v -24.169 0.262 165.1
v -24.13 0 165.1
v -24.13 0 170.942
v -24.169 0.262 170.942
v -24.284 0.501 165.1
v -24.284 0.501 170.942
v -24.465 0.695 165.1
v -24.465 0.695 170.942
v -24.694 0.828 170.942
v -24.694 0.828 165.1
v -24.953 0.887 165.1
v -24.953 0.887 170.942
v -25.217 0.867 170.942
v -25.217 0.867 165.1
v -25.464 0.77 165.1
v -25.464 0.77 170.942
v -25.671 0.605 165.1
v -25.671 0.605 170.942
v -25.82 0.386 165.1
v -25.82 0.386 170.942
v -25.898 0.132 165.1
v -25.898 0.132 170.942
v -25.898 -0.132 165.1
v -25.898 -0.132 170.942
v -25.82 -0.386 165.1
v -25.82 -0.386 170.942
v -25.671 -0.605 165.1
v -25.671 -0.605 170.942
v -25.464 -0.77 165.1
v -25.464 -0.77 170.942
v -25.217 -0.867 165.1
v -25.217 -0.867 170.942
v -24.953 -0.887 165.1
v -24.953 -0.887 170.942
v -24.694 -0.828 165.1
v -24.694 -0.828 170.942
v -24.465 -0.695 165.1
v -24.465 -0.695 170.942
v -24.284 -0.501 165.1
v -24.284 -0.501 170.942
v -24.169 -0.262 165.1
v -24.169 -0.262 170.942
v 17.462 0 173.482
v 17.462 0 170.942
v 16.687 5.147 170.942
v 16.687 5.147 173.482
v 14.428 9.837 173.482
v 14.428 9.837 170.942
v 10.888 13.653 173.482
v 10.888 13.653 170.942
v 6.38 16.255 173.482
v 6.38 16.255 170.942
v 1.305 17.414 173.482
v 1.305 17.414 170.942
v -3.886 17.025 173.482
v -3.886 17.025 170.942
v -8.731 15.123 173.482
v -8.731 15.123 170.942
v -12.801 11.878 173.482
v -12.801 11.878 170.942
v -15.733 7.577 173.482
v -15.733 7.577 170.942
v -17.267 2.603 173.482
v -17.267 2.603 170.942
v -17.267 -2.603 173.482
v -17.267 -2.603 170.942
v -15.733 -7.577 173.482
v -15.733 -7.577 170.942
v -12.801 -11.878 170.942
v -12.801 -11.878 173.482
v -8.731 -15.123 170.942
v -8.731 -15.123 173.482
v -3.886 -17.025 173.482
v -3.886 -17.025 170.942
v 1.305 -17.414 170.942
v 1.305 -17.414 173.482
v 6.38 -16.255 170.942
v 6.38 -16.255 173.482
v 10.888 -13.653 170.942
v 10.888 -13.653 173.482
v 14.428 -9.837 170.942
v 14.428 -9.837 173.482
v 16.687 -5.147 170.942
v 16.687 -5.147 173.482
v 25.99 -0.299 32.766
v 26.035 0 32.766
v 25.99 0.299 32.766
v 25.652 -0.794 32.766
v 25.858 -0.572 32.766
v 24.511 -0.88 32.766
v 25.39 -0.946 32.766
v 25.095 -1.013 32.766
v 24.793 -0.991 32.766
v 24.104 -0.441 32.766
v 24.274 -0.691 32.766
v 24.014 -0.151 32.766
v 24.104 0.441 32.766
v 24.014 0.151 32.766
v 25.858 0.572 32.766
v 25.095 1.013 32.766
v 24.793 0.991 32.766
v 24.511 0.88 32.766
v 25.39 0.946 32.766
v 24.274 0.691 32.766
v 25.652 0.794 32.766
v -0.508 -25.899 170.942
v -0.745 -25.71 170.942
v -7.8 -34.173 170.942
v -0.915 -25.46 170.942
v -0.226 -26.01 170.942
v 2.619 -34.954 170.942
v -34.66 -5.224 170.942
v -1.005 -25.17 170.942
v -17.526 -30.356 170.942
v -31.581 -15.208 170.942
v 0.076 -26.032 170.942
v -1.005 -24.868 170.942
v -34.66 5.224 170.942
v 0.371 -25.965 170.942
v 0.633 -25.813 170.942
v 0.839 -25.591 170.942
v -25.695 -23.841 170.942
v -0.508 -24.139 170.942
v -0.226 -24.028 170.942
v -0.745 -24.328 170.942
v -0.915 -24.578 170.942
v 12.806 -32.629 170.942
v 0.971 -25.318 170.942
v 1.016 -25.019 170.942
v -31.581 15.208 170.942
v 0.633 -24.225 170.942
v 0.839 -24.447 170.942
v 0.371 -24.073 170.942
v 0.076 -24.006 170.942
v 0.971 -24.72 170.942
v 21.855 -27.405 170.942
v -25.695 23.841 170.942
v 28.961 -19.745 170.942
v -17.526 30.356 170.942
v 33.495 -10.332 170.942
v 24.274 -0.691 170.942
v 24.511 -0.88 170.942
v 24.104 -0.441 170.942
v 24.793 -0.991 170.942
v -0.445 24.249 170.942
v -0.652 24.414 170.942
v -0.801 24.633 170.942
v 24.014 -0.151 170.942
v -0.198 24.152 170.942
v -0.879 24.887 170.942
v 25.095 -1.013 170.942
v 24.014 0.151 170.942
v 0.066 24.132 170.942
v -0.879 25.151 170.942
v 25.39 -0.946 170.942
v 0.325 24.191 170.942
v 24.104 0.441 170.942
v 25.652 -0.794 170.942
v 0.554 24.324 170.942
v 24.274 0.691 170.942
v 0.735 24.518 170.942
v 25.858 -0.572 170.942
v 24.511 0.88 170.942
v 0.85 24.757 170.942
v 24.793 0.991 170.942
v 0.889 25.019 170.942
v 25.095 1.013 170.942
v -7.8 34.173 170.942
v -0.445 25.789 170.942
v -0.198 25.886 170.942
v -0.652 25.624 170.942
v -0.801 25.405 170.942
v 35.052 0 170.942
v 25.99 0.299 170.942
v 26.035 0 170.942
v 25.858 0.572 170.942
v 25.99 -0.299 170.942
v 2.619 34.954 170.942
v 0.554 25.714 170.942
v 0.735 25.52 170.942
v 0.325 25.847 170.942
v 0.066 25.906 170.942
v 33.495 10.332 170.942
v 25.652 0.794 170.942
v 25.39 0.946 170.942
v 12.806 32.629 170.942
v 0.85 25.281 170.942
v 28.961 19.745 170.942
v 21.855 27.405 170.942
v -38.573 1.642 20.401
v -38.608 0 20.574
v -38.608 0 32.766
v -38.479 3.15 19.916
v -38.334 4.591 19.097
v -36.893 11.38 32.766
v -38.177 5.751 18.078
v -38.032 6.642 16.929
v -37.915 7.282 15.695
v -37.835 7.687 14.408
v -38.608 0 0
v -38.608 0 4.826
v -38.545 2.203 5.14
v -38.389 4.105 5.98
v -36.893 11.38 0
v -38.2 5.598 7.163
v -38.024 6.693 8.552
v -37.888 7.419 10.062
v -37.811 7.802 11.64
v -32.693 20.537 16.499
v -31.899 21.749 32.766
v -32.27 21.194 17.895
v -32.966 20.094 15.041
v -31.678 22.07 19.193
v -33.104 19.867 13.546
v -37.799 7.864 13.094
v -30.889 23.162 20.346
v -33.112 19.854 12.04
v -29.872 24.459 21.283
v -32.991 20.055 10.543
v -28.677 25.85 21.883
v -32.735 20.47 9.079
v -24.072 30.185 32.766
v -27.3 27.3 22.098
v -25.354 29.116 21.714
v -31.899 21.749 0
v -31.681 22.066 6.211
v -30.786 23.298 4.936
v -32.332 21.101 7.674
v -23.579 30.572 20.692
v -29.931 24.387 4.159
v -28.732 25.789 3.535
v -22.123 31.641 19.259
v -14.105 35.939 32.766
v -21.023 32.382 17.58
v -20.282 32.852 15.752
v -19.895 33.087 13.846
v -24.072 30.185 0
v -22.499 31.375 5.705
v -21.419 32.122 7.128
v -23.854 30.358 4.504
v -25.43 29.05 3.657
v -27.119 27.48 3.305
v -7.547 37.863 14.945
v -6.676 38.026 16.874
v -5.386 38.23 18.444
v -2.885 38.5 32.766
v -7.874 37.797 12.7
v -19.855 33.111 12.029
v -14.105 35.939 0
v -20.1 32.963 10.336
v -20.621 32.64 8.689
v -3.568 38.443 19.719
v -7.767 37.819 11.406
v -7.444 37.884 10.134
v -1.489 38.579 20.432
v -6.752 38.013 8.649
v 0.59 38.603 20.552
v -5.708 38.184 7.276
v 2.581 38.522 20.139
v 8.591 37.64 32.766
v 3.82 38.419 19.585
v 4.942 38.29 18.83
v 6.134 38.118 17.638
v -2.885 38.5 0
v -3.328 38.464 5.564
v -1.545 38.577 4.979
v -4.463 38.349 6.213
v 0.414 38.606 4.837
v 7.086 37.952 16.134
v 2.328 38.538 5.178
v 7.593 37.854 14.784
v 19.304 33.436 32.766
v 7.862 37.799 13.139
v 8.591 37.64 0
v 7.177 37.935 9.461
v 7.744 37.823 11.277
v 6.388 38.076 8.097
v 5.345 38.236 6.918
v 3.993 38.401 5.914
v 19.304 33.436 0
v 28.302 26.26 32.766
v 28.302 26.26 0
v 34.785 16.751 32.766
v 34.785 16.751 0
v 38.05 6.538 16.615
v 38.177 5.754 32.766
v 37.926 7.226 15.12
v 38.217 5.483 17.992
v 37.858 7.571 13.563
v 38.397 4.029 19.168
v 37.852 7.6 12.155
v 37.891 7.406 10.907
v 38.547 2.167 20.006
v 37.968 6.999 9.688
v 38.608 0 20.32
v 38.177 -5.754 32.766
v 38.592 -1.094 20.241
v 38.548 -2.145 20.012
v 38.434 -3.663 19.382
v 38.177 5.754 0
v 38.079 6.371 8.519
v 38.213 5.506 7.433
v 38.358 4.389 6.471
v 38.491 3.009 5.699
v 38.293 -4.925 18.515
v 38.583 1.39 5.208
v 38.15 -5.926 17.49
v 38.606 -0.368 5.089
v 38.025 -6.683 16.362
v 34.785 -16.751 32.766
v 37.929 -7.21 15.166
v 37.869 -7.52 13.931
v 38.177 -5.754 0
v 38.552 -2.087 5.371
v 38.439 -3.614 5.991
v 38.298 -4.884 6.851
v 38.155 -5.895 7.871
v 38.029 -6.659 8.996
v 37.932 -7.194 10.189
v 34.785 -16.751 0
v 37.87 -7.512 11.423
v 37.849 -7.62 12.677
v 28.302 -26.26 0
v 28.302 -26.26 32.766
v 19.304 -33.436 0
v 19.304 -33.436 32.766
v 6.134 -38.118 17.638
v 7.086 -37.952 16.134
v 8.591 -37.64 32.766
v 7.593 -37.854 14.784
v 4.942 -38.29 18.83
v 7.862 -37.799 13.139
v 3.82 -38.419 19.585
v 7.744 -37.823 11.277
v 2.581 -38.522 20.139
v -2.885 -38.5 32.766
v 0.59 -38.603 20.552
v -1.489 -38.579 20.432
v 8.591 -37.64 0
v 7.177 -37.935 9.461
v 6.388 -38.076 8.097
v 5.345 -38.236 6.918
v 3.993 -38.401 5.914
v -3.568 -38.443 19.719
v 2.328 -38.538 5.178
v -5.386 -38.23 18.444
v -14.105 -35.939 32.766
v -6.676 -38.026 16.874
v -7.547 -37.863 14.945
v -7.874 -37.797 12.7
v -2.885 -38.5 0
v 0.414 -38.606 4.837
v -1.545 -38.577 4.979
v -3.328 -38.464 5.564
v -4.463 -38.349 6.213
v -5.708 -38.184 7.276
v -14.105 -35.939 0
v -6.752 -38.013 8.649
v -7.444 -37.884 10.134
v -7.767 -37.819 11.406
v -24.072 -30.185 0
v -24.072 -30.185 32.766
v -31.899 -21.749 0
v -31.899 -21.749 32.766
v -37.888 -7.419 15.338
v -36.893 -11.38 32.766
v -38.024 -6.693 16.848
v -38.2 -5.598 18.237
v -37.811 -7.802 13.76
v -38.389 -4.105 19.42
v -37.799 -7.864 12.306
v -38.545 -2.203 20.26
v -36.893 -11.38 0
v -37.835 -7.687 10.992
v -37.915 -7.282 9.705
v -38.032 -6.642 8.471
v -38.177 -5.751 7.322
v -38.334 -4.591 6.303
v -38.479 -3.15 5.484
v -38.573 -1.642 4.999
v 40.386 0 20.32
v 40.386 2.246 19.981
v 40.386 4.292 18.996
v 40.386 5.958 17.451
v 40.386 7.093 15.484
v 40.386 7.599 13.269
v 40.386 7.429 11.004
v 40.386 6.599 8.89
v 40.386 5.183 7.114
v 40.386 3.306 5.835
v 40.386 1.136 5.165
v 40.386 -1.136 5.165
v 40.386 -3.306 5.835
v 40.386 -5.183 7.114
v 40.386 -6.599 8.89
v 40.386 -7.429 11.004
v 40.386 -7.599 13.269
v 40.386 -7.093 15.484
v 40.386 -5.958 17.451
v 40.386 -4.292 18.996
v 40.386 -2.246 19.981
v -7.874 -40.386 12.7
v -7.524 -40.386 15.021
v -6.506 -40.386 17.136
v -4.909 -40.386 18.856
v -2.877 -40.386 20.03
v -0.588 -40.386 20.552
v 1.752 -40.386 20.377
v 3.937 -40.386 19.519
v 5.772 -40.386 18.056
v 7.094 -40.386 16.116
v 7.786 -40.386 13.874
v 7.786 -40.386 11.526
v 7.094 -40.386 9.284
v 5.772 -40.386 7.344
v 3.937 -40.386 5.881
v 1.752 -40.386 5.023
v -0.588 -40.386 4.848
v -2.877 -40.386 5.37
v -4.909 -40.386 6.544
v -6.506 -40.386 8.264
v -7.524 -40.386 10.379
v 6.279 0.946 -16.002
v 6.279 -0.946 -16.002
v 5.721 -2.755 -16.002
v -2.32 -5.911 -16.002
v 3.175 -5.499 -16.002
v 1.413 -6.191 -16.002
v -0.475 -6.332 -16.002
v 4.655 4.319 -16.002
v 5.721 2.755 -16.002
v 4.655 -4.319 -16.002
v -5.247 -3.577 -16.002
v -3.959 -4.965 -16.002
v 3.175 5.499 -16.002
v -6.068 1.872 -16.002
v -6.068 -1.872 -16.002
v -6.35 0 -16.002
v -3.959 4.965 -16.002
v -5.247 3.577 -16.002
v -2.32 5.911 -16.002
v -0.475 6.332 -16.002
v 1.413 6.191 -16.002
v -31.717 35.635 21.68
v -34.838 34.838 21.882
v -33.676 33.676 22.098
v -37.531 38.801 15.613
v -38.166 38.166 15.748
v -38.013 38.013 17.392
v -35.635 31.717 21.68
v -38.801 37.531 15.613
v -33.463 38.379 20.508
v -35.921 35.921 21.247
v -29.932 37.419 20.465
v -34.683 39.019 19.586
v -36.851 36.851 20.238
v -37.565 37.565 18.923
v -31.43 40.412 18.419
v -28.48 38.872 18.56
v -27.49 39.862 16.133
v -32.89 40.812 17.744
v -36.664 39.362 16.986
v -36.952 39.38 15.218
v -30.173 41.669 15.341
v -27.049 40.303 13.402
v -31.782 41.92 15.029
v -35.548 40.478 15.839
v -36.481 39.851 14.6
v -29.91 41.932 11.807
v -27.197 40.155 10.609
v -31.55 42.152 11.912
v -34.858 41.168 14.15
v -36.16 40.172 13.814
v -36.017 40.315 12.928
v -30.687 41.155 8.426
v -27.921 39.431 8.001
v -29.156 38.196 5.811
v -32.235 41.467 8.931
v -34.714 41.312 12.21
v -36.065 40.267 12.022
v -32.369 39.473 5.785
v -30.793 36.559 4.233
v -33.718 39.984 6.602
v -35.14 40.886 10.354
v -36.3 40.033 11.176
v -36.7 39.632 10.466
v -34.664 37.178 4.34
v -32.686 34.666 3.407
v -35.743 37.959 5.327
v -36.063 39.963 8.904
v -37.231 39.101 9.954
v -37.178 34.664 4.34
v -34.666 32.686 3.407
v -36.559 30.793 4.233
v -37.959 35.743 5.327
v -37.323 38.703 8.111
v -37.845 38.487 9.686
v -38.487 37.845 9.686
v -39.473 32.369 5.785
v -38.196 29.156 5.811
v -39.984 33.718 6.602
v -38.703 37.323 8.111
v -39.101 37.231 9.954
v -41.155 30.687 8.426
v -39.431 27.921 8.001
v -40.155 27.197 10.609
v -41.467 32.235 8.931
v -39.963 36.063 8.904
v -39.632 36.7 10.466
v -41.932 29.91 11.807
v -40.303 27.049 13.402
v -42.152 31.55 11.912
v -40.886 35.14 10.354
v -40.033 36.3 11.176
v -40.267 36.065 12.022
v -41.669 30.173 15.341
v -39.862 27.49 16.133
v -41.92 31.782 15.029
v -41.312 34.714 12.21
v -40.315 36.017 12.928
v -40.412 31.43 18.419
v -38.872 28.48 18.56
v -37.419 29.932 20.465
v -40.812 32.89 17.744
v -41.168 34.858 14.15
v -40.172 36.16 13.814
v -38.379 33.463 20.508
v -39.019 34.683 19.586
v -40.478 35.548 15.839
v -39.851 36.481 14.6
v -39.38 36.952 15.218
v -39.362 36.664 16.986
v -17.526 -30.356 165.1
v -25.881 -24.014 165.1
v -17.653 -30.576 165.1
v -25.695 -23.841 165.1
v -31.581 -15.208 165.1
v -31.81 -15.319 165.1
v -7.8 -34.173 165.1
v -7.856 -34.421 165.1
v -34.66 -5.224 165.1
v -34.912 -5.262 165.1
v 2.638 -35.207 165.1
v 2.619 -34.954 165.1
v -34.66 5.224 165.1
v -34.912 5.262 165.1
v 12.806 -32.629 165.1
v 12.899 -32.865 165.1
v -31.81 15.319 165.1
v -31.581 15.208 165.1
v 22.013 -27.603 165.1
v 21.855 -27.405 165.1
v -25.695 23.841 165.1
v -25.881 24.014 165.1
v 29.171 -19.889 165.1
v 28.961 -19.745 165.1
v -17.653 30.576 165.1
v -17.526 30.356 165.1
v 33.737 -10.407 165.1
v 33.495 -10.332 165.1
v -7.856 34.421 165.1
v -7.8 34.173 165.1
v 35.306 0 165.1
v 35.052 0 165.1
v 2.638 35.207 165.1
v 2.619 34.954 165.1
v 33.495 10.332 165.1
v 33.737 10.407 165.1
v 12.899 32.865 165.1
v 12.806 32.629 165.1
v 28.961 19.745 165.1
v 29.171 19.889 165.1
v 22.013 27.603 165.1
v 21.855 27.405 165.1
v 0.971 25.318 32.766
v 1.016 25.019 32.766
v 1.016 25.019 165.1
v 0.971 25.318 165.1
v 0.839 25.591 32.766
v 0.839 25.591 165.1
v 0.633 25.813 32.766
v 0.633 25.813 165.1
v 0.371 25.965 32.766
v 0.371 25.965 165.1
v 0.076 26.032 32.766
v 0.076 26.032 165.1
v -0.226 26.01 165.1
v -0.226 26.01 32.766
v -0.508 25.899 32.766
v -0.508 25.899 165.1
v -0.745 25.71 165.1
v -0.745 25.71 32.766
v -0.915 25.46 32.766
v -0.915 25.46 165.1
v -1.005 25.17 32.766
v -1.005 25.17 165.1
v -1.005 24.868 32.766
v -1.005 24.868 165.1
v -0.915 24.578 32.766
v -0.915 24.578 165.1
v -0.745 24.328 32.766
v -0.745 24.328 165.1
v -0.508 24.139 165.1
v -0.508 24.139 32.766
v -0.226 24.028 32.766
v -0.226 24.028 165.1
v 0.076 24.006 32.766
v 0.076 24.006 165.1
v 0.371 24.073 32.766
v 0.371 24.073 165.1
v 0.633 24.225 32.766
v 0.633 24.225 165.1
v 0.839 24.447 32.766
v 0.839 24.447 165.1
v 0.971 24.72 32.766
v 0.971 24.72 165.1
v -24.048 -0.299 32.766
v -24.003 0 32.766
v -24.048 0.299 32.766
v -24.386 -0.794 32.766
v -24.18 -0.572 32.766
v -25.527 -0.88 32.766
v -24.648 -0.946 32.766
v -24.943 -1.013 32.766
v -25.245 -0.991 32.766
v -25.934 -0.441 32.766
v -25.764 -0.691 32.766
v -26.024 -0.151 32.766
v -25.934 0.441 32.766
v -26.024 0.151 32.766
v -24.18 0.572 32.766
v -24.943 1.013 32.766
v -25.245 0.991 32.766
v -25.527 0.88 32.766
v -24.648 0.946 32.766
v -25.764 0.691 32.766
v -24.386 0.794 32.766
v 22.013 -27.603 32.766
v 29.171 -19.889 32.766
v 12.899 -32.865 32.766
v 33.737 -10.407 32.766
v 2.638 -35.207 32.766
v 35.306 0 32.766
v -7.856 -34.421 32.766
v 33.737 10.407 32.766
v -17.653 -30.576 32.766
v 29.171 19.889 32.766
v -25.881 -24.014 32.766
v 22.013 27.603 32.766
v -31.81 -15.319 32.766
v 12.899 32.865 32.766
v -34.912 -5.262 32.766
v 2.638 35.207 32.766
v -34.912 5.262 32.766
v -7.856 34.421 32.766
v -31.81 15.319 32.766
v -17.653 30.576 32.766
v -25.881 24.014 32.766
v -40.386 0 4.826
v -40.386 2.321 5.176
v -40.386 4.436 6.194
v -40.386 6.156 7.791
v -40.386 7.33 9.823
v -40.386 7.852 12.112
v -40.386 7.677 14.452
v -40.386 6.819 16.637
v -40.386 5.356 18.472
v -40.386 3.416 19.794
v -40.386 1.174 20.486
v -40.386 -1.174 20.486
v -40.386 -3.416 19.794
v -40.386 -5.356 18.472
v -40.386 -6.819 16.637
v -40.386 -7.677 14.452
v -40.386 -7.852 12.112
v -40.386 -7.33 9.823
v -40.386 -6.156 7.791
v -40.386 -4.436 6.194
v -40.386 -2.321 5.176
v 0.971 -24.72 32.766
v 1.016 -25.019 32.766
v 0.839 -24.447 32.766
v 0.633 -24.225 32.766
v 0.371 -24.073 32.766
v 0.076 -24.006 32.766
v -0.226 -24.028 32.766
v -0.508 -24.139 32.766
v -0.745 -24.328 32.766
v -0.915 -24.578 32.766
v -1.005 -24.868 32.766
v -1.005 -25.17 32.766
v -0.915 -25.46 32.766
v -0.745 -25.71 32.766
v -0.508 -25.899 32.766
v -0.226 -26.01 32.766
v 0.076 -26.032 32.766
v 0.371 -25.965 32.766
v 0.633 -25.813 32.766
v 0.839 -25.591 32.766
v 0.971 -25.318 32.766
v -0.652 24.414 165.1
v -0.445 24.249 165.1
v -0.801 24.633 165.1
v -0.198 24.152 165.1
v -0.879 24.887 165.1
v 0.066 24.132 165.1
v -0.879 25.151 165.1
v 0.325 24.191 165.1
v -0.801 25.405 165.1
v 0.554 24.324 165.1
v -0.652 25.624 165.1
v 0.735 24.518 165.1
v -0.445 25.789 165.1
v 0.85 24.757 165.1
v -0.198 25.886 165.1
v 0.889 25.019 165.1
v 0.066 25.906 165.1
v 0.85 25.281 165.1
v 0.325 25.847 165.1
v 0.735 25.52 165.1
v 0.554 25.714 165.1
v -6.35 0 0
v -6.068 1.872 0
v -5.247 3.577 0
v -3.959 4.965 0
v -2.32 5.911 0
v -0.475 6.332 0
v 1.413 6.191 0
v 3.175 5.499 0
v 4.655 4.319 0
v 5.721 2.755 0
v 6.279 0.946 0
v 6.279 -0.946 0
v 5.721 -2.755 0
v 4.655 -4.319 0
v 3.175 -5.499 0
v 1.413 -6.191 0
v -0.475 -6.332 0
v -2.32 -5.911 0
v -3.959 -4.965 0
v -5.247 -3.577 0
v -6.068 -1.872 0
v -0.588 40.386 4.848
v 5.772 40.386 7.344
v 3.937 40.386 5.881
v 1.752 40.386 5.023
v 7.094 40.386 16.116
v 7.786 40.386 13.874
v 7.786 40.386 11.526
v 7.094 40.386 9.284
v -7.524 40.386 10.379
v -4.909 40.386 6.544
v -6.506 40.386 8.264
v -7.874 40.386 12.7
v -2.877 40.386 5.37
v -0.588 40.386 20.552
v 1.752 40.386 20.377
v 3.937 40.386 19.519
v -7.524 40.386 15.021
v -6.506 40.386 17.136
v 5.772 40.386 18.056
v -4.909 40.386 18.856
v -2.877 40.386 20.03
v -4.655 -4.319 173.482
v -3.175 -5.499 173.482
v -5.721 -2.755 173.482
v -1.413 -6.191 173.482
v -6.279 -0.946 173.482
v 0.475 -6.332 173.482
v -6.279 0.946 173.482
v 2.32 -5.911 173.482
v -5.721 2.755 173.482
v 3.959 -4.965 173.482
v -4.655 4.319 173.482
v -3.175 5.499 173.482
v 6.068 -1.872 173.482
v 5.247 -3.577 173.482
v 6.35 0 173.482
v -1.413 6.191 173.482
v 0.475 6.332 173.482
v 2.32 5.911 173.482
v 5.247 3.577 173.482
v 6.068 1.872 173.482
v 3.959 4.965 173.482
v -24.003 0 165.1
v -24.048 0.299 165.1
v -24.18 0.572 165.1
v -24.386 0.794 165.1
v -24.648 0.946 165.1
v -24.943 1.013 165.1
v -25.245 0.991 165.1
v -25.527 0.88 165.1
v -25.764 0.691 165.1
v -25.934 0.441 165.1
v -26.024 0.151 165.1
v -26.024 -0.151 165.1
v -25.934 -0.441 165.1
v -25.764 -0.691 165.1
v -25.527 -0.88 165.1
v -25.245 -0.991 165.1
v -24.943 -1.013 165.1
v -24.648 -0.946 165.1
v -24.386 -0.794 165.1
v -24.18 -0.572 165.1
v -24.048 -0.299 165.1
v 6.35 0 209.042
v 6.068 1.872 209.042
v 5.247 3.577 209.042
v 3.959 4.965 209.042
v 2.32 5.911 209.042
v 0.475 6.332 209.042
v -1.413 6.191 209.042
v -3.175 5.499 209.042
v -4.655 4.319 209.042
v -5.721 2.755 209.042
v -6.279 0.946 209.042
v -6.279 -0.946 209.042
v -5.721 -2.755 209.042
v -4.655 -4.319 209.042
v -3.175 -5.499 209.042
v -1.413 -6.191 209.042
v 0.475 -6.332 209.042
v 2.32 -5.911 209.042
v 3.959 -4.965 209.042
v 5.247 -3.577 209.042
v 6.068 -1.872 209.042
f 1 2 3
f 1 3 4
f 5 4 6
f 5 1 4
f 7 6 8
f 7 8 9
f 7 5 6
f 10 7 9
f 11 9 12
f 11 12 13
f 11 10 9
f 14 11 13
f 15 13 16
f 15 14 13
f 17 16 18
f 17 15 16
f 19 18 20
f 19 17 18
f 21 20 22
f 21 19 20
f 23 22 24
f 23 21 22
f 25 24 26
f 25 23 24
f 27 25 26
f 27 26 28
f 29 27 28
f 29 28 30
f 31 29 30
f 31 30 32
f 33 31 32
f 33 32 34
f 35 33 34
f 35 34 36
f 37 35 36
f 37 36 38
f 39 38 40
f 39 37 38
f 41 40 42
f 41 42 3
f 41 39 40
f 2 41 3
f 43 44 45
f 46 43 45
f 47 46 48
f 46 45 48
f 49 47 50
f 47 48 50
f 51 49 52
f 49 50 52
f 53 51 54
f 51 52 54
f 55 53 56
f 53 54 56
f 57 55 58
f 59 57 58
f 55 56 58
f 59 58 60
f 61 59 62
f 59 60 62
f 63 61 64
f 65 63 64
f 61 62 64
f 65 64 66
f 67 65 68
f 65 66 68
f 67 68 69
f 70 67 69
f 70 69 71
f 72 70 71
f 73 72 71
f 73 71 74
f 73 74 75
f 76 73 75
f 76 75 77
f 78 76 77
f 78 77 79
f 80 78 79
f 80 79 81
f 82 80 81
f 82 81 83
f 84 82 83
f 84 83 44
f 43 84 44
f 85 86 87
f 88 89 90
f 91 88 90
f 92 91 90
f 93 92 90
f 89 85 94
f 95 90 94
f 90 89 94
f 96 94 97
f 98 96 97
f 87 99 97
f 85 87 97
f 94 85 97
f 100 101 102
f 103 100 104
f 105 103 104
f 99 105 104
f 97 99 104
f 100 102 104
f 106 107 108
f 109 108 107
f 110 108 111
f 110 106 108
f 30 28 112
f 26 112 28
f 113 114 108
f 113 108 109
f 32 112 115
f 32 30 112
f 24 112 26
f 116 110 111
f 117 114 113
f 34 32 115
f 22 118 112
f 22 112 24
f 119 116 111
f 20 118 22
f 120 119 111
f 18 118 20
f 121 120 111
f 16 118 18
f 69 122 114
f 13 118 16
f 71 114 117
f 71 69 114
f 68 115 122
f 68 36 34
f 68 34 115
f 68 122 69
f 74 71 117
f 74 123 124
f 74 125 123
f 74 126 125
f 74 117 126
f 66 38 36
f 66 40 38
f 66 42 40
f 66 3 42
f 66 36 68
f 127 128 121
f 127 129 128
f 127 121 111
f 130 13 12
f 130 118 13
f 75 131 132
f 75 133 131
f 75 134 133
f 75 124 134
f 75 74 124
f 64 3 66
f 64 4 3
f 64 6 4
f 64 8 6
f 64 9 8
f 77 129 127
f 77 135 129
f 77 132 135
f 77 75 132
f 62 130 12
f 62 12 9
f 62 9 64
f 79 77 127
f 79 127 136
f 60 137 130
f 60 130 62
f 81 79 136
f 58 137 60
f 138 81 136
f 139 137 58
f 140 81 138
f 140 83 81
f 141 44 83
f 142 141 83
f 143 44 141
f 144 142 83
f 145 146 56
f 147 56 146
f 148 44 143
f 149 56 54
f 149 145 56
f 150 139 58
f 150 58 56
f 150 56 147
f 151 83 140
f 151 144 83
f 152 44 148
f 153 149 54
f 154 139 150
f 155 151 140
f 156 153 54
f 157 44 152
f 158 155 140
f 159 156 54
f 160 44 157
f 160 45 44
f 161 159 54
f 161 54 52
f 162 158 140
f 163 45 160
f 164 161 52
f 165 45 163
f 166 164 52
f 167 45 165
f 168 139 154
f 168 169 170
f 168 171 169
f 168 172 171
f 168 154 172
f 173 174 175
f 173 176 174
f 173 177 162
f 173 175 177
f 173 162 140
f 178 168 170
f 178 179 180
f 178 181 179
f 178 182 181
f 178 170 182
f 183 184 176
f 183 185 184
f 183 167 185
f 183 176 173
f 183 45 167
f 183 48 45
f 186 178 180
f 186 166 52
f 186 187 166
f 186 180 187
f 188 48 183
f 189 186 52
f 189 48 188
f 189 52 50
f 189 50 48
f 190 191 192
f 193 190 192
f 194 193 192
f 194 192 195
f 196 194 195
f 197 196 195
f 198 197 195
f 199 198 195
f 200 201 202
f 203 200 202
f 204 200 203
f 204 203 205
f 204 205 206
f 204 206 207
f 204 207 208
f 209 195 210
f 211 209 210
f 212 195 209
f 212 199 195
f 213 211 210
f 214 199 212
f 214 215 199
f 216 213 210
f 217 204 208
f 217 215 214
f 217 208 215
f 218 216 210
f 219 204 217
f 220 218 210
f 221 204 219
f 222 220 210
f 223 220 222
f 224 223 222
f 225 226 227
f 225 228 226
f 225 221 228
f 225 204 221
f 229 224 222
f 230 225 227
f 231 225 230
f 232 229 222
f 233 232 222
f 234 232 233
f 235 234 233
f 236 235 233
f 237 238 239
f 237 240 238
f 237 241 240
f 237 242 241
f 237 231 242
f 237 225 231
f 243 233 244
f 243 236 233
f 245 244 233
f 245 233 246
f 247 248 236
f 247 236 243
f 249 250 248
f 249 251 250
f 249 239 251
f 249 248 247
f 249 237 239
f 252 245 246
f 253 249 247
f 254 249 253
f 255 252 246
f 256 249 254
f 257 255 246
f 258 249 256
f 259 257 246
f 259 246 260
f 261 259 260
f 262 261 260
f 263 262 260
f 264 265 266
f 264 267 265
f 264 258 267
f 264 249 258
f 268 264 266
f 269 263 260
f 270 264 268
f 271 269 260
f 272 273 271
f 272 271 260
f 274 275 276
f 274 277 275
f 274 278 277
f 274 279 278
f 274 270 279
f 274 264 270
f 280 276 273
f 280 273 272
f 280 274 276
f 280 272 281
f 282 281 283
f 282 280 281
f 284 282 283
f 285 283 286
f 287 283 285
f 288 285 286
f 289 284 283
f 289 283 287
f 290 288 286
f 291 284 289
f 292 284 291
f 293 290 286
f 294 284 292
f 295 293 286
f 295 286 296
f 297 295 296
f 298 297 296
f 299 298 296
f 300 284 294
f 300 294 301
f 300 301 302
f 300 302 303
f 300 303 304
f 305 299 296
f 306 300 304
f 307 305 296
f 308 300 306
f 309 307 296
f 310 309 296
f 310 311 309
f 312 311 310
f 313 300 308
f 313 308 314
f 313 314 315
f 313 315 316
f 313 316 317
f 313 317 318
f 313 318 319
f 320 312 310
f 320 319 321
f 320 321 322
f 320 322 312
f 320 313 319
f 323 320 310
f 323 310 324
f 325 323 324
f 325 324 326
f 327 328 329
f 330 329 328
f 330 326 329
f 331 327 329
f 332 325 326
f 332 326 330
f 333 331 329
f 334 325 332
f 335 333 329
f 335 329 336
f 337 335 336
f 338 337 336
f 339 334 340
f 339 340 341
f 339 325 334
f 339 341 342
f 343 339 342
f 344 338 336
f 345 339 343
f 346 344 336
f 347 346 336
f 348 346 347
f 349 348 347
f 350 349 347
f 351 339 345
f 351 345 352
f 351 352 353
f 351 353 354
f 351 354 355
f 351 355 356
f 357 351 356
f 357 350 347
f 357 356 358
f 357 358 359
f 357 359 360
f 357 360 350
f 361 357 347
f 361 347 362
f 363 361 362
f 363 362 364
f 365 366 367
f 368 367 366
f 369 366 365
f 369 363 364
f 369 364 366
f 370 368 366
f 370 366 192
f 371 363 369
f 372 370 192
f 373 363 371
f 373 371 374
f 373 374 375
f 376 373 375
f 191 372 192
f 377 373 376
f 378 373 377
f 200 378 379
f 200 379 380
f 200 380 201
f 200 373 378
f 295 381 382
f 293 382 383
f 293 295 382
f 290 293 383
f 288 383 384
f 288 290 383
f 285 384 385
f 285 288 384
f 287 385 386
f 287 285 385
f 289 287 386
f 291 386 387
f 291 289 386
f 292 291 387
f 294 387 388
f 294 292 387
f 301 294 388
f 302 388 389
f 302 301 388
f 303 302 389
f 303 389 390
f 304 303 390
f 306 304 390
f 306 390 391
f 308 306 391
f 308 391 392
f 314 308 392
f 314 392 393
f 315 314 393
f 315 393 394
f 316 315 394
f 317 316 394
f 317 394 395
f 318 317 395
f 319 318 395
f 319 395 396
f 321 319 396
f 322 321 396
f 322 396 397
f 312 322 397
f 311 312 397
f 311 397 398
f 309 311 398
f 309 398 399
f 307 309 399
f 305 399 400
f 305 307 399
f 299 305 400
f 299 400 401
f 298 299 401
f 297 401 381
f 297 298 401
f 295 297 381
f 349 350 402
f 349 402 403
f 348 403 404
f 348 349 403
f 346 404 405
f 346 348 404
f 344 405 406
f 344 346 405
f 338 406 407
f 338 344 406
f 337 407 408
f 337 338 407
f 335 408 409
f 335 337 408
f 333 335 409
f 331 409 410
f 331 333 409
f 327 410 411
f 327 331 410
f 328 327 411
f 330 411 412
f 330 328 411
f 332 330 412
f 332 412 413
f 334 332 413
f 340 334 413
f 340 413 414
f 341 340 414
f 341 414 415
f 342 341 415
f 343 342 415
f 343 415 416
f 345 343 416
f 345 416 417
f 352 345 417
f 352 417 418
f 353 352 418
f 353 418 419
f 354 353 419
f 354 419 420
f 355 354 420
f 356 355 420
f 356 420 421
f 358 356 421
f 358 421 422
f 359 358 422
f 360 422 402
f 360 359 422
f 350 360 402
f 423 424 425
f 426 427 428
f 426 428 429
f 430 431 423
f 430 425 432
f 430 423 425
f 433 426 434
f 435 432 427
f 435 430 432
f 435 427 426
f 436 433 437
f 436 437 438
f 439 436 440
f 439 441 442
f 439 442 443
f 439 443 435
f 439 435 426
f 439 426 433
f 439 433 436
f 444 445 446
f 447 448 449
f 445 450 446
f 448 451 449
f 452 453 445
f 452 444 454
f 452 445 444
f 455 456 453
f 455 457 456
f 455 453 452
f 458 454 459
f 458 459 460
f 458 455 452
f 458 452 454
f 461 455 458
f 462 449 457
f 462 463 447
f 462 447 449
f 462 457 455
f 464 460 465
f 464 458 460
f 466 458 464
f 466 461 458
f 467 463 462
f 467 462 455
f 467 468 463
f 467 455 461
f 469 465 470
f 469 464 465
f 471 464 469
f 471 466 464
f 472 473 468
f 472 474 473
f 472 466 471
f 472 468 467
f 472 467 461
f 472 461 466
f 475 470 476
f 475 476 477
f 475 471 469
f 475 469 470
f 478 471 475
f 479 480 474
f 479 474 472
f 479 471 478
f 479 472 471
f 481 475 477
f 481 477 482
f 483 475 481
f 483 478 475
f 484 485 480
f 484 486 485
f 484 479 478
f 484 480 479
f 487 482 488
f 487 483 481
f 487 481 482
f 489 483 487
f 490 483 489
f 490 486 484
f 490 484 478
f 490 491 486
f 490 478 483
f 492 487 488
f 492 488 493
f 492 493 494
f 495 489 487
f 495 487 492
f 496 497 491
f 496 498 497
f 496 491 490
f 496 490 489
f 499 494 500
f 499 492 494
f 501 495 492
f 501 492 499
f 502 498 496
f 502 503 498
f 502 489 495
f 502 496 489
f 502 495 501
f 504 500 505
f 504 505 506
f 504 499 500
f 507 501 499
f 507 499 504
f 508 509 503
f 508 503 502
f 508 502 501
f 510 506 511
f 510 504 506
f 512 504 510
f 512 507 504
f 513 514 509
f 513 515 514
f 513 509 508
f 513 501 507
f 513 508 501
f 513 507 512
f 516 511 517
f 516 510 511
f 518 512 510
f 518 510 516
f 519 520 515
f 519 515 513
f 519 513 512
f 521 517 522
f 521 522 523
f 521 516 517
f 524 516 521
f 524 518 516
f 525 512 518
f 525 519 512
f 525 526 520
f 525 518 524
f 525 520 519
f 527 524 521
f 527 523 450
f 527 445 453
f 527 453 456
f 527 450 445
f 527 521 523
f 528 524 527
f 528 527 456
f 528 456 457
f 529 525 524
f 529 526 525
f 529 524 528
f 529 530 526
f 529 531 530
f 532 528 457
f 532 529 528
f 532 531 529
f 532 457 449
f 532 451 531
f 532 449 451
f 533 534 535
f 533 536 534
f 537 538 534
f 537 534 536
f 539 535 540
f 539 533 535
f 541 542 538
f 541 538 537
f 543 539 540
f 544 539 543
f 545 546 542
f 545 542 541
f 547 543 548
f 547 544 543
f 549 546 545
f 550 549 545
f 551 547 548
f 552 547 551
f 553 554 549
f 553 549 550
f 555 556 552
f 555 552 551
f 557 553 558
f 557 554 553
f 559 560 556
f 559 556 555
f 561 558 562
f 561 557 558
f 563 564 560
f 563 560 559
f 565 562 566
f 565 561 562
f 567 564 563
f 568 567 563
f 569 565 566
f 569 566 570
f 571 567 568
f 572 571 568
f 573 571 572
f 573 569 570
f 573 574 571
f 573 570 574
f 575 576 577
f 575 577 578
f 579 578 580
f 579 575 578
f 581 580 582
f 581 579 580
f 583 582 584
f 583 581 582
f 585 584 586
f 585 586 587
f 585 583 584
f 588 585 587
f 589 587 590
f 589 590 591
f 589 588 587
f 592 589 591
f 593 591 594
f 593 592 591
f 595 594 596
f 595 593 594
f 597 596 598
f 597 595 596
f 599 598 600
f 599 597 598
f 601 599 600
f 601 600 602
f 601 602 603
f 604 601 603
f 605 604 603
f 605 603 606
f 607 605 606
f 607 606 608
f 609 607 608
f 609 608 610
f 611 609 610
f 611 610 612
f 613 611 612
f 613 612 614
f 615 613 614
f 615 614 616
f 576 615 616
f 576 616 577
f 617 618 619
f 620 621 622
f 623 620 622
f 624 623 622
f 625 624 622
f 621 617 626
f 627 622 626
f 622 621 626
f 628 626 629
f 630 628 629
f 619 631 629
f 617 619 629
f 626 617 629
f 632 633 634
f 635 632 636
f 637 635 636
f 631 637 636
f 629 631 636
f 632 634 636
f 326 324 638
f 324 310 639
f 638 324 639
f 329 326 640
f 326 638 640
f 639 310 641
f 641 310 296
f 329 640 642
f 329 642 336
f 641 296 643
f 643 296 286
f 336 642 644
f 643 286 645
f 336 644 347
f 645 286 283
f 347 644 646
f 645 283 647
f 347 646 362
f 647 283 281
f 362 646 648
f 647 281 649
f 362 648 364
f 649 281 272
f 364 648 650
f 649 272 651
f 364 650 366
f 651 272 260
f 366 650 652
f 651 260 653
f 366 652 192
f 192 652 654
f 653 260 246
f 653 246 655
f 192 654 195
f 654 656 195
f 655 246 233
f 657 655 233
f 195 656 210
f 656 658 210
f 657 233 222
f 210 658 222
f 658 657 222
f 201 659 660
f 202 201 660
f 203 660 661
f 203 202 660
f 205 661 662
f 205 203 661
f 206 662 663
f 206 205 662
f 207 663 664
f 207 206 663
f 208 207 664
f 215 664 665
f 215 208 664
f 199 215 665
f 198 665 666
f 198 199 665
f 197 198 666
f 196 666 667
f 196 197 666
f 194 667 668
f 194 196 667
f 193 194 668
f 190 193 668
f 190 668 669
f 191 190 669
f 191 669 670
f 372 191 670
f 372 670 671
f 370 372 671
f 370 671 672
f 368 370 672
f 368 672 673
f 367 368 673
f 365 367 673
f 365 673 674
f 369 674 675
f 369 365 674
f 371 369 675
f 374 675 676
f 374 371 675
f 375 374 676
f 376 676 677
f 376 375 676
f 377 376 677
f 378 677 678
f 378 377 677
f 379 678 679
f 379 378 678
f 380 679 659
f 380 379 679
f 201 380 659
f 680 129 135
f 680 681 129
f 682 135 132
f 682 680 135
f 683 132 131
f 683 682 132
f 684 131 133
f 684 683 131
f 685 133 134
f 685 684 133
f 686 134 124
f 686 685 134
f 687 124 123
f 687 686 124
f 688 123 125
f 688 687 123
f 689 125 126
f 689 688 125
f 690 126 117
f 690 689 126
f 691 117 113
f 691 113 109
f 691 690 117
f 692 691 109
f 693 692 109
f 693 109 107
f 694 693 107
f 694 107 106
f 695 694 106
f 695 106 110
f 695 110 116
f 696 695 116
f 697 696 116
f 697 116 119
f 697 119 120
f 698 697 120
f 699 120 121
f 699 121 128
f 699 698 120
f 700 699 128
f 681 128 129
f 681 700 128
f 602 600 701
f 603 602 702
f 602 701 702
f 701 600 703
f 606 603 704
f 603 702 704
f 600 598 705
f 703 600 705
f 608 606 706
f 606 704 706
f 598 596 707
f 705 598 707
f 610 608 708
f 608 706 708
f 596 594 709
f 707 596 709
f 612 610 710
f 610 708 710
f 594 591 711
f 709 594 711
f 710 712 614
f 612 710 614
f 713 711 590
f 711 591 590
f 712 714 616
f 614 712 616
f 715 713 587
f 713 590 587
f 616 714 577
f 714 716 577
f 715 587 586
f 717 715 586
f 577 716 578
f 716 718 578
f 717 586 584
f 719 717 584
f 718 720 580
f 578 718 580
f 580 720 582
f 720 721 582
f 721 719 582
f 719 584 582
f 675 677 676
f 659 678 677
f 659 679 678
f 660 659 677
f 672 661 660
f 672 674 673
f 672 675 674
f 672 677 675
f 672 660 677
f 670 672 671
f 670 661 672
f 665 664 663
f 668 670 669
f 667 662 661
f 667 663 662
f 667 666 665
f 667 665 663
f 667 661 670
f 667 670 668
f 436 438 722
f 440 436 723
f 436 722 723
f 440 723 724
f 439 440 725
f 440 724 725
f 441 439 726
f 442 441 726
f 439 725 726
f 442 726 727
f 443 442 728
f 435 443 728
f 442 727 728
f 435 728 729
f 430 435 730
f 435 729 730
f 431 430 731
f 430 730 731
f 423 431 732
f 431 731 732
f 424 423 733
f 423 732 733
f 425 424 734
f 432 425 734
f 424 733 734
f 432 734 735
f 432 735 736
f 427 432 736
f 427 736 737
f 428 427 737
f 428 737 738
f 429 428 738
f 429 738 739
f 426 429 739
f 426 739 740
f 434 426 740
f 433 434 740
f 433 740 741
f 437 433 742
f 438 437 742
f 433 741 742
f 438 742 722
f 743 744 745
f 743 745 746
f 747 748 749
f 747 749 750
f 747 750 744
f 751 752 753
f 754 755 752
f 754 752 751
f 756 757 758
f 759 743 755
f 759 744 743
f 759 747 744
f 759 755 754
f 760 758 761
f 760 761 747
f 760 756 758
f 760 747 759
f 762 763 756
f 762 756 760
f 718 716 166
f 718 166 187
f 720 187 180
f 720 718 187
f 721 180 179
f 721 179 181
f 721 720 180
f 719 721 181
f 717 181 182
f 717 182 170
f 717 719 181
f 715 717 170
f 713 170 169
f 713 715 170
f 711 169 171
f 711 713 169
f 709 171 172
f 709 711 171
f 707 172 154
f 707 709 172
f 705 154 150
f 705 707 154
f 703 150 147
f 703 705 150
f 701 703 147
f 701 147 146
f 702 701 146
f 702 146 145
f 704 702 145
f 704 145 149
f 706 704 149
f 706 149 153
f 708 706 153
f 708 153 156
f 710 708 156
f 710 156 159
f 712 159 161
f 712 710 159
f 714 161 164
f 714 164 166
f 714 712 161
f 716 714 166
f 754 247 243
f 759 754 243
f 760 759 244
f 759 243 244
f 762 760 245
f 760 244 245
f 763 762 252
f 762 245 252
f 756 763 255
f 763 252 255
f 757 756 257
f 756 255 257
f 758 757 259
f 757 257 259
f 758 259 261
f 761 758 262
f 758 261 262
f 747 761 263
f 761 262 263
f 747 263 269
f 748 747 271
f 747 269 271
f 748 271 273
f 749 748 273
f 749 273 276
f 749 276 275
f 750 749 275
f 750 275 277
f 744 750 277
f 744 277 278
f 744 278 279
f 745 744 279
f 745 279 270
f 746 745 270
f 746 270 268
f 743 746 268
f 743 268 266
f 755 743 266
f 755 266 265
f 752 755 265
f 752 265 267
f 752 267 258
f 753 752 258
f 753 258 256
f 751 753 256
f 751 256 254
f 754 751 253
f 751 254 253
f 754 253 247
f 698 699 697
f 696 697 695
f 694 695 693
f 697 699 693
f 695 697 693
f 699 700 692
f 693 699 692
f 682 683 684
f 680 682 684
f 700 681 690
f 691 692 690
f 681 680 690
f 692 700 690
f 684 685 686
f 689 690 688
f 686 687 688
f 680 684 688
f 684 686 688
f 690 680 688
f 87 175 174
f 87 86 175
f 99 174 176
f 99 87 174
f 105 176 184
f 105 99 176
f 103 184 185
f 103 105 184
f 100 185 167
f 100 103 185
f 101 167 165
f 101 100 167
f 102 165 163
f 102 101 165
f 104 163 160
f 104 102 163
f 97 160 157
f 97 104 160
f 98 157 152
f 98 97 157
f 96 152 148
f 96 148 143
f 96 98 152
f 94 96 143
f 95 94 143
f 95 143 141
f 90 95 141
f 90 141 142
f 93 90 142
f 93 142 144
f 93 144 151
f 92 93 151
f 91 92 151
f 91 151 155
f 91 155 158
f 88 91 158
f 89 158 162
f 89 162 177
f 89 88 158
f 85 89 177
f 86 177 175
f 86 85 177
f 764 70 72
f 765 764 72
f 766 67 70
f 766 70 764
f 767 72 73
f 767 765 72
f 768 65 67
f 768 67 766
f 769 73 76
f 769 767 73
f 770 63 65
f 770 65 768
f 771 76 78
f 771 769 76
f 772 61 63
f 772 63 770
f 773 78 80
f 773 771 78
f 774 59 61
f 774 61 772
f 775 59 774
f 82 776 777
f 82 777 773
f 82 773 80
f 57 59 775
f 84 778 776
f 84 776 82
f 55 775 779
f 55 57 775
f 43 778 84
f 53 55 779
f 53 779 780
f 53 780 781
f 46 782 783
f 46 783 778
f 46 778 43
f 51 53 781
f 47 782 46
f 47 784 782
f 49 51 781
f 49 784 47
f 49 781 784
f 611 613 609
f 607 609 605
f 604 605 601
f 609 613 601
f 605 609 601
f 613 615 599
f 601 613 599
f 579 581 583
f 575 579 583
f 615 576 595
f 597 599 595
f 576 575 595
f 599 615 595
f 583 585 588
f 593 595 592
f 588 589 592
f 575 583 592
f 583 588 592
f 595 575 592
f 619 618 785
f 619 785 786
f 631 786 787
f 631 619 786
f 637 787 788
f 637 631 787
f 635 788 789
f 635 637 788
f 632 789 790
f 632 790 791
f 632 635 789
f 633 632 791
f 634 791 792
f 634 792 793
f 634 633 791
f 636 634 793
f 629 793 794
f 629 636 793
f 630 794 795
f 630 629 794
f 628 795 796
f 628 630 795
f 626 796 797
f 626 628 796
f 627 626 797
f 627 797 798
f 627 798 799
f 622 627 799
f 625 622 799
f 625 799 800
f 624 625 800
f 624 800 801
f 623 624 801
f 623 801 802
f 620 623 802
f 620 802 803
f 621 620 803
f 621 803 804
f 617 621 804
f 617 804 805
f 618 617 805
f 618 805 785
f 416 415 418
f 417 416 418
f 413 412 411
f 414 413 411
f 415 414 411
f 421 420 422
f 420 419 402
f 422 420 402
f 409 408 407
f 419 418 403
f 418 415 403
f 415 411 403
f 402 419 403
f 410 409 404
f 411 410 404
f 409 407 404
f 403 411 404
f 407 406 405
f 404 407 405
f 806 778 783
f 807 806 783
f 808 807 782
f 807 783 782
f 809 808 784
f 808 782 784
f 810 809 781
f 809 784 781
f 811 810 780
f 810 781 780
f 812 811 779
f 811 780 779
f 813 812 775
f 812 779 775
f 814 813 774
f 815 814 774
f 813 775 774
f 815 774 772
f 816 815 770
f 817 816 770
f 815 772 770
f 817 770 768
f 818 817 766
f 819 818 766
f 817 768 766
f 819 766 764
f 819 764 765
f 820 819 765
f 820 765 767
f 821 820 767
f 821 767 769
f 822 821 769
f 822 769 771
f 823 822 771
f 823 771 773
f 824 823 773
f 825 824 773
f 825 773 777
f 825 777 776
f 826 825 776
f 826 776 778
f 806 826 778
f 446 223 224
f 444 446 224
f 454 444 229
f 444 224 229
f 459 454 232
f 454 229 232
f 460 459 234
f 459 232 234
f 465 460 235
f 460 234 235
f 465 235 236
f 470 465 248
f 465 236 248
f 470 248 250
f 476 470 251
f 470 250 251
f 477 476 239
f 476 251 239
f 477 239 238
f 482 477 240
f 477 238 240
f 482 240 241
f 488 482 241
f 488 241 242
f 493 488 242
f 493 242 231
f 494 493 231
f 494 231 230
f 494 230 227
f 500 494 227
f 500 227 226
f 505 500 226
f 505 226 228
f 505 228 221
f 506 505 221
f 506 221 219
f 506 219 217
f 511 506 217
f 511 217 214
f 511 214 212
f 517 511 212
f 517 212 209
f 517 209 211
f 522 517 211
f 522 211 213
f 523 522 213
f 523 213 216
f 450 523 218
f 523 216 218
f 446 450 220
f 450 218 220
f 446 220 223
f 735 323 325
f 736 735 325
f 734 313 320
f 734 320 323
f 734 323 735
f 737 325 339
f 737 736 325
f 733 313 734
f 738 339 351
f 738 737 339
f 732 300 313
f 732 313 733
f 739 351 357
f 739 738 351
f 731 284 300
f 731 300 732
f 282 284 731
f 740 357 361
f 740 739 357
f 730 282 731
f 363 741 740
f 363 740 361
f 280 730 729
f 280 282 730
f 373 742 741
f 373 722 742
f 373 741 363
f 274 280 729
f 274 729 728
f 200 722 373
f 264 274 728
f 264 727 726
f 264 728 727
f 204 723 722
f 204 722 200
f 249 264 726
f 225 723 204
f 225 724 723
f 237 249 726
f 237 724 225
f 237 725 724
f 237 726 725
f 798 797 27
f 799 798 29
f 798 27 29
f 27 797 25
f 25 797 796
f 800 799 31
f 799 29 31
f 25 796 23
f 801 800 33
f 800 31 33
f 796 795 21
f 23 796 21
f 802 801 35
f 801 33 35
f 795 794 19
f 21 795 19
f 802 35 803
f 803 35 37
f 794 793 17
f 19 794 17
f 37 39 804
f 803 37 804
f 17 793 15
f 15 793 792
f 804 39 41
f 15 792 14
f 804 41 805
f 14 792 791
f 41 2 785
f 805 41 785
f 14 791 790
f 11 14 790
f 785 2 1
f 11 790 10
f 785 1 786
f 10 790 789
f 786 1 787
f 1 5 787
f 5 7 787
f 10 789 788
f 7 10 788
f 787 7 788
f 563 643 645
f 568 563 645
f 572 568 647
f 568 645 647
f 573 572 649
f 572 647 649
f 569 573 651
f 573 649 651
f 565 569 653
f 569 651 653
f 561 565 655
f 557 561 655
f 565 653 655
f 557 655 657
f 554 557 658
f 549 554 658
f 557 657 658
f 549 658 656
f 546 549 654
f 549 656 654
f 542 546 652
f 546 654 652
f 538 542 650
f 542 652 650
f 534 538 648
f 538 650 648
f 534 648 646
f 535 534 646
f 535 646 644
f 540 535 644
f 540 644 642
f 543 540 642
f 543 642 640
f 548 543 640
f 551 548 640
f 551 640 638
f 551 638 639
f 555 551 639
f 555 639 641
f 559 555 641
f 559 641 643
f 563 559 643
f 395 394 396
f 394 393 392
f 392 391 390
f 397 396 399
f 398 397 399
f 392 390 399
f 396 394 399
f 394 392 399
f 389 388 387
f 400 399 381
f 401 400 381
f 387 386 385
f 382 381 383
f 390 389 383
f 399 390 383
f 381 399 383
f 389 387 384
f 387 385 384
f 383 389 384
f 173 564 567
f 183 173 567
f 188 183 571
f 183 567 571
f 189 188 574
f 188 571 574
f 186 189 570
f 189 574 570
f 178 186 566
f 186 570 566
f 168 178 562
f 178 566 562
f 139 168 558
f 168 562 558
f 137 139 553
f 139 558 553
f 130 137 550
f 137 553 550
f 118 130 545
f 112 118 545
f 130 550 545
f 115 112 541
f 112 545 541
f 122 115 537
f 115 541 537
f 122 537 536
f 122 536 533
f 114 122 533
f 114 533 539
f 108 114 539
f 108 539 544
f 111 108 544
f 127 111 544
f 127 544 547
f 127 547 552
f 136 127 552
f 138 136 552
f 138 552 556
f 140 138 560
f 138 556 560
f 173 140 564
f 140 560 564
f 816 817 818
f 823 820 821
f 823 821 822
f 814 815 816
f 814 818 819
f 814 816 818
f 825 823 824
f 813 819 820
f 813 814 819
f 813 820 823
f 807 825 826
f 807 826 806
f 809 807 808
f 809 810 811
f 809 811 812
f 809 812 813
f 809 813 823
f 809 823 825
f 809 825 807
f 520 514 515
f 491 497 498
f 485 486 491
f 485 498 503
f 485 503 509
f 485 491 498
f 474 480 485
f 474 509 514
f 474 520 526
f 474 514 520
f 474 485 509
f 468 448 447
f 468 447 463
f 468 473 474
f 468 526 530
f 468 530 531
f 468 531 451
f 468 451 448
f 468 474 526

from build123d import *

# Parameters (mm, degrees)
SKETCH1_R            = 35.306
SKETCH1_R_2          = 1.016
BASE_EXTRUDE_DEPTH   = 165.1
SKETCH2_R            = 38.608
BOSS_EXTRUDE1_DEPTH  = 32.766
SKETCH3_R            = 6.35
BOSS_EXTRUDE2_DEPTH  = 43.942
SKETCH4_R            = 17.4625
BOSS_EXTRUDE3_DEPTH  = 8.382
SKETCH7_R            = 7.874
BOSS_EXTRUDE5_DEPTH  = 40.386
SKETCH9_R            = 7.62
BOSS_EXTRUDE7_DEPTH  = 80.772
SKETCH11_R           = 7.874
BOSS_EXTRUDE8_DEPTH  = 40.386
BOSS_EXTRUDE10_START = -80.772
SKETCH12_R           = 7.874
BOSS_EXTRUDE10_DEPTH = 80.772
SKETCH13_R           = 9.398
BOSS_EXTRUDE11_DEPTH = 53.975
FILLET1_R            = 6.35
BOSS_EXTRUDE12_START = 16.002
SKETCH14_R           = 6.35
BOSS_EXTRUDE12_DEPTH = 16.002
SKETCH15_R           = 35.052
SKETCH15_R_2         = 1.016
SKETCH15_R_3         = 0.889
BOSS_EXTRUDE13_DEPTH = 5.842


with BuildPart() as part:
    # Sketch1 → Base-Extrude (new body)
    with BuildSketch(Plane.XY):
        Circle(SKETCH1_R)
        with Locations((25.019, 0)):
            Circle(SKETCH1_R_2, mode=Mode.SUBTRACT)
        with Locations((0, 25.019)):
            Circle(SKETCH1_R_2, mode=Mode.SUBTRACT)
        with Locations((-25.019, 0)):
            Circle(SKETCH1_R_2, mode=Mode.SUBTRACT)
        with Locations((0, -25.019)):
            Circle(SKETCH1_R_2, mode=Mode.SUBTRACT)
    extrude(amount=BASE_EXTRUDE_DEPTH)

    # Sketch2 → Boss-Extrude1 (add)
    with BuildSketch(Plane(origin=(0, 0, 0), x_dir=(-1, 0, 0), z_dir=(0, 0, -1))):
        Circle(SKETCH2_R)
    extrude(amount=-BOSS_EXTRUDE1_DEPTH)

    # Sketch3 → Boss-Extrude2 (add)
    with BuildSketch(Plane.XY.offset(165.1)):
        Circle(SKETCH3_R)
    extrude(amount=BOSS_EXTRUDE2_DEPTH)

    # Sketch4 → Boss-Extrude3 (add)
    with BuildSketch(Plane.XY.offset(165.1)):
        Circle(SKETCH4_R)
    extrude(amount=BOSS_EXTRUDE3_DEPTH)

    # Sketch7 → Boss-Extrude5 (add)
    with BuildSketch(Plane(origin=(0, 0, 0), x_dir=(0, 0, -1), z_dir=(1, 0, 0))):
        with Locations((-12.7, 0)):
            Circle(SKETCH7_R)
    extrude(amount=-BOSS_EXTRUDE5_DEPTH)

    # Sketch9 → Boss-Extrude7 (add)
    with BuildSketch(Plane.ZY.offset(40.386)):
        with Locations((12.7, 0)):
            Circle(SKETCH9_R)
    extrude(amount=-BOSS_EXTRUDE7_DEPTH)

    # Sketch11 → Boss-Extrude8 (add)
    with BuildSketch(Plane(origin=(0, 0, 0), x_dir=(-1, 0, 0), z_dir=(0, 1, 0))):
        with Locations((0, 12.7)):
            Circle(SKETCH11_R)
    extrude(amount=BOSS_EXTRUDE8_DEPTH)

    # Sketch12 → Boss-Extrude10 (add)
    with BuildSketch(Plane(origin=(0, 40.386, 0), x_dir=(-1, 0, 0), z_dir=(0, 1, 0)).offset(BOSS_EXTRUDE10_START)):
        with Locations((0, 12.7)):
            Circle(SKETCH12_R)
    extrude(amount=BOSS_EXTRUDE10_DEPTH)

    # Sketch13 → Boss-Extrude11 (add)
    with BuildSketch(Plane(origin=(0, 0, 0), x_dir=(0, 0, 1), z_dir=(-0.7071067811865488, 0.7071067811865462, 0))):
        with Locations((12.7, 0)):
            Circle(SKETCH13_R)
    extrude(amount=BOSS_EXTRUDE11_DEPTH)

    # Fillet1
    fillet1_edges = [part.edges().sort_by_distance(p)[0] for p in [
        (-38.166088515, 38.166088515, 3.302),
    ]]
    fillet(fillet1_edges, radius=FILLET1_R)

    # Sketch14 → Boss-Extrude12 (add)
    with BuildSketch(Plane(origin=(0, 0, 0), x_dir=(-1, 0, 0), z_dir=(0, 0, -1)).offset(BOSS_EXTRUDE12_START)):
        Circle(SKETCH14_R)
    extrude(amount=-BOSS_EXTRUDE12_DEPTH)

    # Sketch15 → Boss-Extrude13 (add)
    with BuildSketch(Plane.XY.offset(165.1)):
        Circle(SKETCH15_R)
        with Locations((25.019, 0)):
            Circle(SKETCH15_R_2, mode=Mode.SUBTRACT)
        with Locations((0, 25.019)):
            Circle(SKETCH15_R_3, mode=Mode.SUBTRACT)
        with Locations((0, -25.019)):
            Circle(SKETCH15_R_2, mode=Mode.SUBTRACT)
        with Locations((-25.019, 0)):
            Circle(SKETCH15_R_3, mode=Mode.SUBTRACT)
    extrude(amount=BOSS_EXTRUDE13_DEPTH)


solid = part.part
